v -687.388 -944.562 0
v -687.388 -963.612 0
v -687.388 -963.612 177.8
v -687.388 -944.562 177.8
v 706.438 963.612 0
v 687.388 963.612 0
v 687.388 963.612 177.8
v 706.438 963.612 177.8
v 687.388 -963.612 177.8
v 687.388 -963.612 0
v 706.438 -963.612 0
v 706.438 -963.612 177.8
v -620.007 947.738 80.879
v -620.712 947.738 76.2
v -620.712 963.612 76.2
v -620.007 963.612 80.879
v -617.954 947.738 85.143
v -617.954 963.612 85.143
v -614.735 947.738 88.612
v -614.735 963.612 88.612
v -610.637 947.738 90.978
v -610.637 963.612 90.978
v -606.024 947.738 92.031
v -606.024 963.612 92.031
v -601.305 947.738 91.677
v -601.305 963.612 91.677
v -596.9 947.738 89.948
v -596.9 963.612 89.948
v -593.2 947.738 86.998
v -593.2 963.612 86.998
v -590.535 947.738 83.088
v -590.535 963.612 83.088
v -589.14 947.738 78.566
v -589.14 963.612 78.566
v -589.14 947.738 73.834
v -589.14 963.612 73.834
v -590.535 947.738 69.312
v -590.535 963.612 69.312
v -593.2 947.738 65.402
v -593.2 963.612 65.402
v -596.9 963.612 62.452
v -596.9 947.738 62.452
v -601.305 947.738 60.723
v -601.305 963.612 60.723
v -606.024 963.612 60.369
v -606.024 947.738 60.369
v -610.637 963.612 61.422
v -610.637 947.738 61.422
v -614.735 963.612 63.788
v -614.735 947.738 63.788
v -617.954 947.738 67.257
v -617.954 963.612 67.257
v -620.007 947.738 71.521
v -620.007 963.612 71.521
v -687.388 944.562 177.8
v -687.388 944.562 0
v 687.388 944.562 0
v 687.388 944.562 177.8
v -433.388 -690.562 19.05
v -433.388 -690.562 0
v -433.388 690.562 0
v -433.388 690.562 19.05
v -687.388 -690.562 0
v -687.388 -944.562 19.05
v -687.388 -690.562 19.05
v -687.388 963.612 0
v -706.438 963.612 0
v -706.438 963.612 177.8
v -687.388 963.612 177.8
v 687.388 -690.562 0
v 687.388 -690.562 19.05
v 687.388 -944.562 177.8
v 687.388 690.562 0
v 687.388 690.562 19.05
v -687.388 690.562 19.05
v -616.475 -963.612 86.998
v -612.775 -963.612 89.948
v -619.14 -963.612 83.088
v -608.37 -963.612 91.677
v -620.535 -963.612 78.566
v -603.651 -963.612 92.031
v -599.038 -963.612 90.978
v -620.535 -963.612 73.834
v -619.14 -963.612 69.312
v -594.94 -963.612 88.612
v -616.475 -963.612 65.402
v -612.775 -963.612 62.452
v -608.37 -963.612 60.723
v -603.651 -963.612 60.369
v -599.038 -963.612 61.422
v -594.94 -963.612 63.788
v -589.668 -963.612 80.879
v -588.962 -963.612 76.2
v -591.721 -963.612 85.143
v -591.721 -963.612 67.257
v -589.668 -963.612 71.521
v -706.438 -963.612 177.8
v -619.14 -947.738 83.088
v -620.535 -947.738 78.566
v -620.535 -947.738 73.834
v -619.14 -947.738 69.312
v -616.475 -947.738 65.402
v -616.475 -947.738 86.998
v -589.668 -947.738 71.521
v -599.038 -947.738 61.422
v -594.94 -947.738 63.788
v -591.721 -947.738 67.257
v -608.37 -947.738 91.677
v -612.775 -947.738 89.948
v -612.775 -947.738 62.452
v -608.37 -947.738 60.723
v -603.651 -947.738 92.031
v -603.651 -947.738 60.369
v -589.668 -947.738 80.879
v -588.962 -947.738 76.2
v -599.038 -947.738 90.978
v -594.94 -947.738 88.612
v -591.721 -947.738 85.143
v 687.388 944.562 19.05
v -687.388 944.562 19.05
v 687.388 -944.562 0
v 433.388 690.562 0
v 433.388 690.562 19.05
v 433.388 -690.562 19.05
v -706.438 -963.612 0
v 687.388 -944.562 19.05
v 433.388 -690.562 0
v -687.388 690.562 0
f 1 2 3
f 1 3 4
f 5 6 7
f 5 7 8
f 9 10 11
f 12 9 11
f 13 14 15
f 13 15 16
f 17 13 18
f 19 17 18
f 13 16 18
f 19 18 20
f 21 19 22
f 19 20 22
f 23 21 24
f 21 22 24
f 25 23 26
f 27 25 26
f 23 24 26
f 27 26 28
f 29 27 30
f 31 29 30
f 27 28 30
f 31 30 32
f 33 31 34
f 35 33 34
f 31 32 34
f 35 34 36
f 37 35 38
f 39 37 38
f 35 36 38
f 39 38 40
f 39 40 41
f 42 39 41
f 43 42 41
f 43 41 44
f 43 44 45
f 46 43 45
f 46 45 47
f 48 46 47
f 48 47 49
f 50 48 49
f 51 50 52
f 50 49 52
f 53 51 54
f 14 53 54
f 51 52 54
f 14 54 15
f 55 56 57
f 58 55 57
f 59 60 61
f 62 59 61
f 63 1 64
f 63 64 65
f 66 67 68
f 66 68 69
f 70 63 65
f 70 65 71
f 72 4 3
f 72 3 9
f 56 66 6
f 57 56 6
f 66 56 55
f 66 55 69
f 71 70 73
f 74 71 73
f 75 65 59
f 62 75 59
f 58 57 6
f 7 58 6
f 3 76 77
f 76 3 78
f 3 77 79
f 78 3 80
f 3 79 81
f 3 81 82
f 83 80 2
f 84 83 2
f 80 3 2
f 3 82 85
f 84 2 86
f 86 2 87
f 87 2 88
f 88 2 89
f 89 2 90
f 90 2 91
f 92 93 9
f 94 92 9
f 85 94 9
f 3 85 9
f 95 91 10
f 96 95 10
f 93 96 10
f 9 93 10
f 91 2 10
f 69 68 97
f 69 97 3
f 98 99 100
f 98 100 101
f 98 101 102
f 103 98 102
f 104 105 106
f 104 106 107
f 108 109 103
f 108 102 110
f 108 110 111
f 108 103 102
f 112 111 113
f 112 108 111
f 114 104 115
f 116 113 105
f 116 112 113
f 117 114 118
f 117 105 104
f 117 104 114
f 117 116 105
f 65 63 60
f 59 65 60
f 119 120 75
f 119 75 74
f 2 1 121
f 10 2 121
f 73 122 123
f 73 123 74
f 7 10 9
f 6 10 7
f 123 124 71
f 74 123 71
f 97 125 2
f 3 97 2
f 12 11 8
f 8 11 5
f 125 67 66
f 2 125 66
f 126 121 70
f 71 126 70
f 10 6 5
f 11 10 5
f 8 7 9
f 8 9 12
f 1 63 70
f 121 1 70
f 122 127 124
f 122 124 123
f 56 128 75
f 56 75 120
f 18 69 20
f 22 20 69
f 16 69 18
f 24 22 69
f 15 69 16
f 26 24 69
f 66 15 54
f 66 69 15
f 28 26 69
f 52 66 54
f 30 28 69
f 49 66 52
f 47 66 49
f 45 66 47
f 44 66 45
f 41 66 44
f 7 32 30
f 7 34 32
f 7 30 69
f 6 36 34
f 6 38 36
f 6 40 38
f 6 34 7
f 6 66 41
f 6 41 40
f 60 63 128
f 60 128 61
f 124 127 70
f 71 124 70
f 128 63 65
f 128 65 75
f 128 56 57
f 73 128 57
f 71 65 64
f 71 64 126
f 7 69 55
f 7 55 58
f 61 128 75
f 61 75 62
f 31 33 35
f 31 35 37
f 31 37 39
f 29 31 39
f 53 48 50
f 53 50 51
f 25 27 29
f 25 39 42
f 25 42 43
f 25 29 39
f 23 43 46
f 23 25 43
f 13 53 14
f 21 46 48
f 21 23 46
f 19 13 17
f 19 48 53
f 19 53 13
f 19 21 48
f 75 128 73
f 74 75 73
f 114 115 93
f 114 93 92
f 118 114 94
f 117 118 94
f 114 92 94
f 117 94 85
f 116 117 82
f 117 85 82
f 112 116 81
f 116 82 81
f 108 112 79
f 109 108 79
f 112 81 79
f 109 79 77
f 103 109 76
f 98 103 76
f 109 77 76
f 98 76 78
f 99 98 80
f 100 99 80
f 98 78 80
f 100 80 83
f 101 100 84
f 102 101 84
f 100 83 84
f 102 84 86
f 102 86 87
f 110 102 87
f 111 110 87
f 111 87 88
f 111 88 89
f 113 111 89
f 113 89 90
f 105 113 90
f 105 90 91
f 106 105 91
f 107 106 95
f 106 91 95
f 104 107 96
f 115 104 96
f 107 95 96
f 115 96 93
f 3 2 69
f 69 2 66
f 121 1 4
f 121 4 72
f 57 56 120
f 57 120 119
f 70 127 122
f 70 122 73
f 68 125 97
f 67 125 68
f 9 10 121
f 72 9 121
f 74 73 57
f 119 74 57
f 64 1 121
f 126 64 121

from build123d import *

# Parameters (mm, degrees)
F0_W      = 1374.775
F0_H      = 254
F1_DEPTH  = 19.05
F2_W      = 254
F2_H      = 1381.125
F3_DEPTH  = 19.05
F4_W      = 19.05
F4_H      = 1927.225
F5_DEPTH  = 177.8
F6_W      = 1374.775
F6_H      = 19.05
F7_DEPTH  = 177.8
F8_R      = 15.875
F9_DEPTH  = 15.875
F10_R     = 15.875
F11_DEPTH = 15.875


with BuildPart() as f1:
    # F0 (on Top) → F1 (new body)
    with BuildSketch(Plane.XY):
        with Locations((0, -817.5625)):
            Rectangle(F0_W, F0_H)
        with Locations((0, 817.5625)):
            Rectangle(F0_W, F0_H)
    extrude(amount=F1_DEPTH)


with BuildPart() as f3:
    # F2 (on Top) → F3 (new body, through all)
    with BuildSketch(Plane.XY):
        with Locations((-560.3875, 0)):
            Rectangle(F2_W, F2_H)
        with Locations((560.3875, 0)):
            Rectangle(F2_W, F2_H)
    extrude(amount=F3_DEPTH)


with BuildPart() as f5:
    # F4 (on Top) → F5 (new body)
    with BuildSketch(Plane.XY):
        with Locations((-696.9125, 0)):
            Rectangle(F4_W, F4_H)
        with Locations((696.9125, 0)):
            Rectangle(F4_W, F4_H)
    extrude(amount=F5_DEPTH)


with BuildPart() as f7:
    # F6 (on Top) → F7 (new body, through all)
    with BuildSketch(Plane.XY):
        with Locations((0, -954.0875)):
            Rectangle(F6_W, F6_H)
        with Locations((0, 954.0875)):
            Rectangle(F6_W, F6_H)
    extrude(amount=F7_DEPTH)

    # F8 (on face) → F9 (cut)
    with BuildSketch(Plane.XZ.offset(963.6125)):
        with Locations((-604.8375, 76.2)):
            Circle(F8_R)
    extrude(amount=-F9_DEPTH, mode=Mode.SUBTRACT)

    # F10 (on face) → F11 (cut)
    with BuildSketch(Plane(origin=(0, 963.6125, 0), x_dir=(-1, 0, 0), z_dir=(0, 1, 0))):
        with Locations((604.8375, 76.2)):
            Circle(F10_R)
    extrude(amount=-F11_DEPTH, mode=Mode.SUBTRACT)


solid = Compound([f1.part, f3.part, f5.part, f7.part])
